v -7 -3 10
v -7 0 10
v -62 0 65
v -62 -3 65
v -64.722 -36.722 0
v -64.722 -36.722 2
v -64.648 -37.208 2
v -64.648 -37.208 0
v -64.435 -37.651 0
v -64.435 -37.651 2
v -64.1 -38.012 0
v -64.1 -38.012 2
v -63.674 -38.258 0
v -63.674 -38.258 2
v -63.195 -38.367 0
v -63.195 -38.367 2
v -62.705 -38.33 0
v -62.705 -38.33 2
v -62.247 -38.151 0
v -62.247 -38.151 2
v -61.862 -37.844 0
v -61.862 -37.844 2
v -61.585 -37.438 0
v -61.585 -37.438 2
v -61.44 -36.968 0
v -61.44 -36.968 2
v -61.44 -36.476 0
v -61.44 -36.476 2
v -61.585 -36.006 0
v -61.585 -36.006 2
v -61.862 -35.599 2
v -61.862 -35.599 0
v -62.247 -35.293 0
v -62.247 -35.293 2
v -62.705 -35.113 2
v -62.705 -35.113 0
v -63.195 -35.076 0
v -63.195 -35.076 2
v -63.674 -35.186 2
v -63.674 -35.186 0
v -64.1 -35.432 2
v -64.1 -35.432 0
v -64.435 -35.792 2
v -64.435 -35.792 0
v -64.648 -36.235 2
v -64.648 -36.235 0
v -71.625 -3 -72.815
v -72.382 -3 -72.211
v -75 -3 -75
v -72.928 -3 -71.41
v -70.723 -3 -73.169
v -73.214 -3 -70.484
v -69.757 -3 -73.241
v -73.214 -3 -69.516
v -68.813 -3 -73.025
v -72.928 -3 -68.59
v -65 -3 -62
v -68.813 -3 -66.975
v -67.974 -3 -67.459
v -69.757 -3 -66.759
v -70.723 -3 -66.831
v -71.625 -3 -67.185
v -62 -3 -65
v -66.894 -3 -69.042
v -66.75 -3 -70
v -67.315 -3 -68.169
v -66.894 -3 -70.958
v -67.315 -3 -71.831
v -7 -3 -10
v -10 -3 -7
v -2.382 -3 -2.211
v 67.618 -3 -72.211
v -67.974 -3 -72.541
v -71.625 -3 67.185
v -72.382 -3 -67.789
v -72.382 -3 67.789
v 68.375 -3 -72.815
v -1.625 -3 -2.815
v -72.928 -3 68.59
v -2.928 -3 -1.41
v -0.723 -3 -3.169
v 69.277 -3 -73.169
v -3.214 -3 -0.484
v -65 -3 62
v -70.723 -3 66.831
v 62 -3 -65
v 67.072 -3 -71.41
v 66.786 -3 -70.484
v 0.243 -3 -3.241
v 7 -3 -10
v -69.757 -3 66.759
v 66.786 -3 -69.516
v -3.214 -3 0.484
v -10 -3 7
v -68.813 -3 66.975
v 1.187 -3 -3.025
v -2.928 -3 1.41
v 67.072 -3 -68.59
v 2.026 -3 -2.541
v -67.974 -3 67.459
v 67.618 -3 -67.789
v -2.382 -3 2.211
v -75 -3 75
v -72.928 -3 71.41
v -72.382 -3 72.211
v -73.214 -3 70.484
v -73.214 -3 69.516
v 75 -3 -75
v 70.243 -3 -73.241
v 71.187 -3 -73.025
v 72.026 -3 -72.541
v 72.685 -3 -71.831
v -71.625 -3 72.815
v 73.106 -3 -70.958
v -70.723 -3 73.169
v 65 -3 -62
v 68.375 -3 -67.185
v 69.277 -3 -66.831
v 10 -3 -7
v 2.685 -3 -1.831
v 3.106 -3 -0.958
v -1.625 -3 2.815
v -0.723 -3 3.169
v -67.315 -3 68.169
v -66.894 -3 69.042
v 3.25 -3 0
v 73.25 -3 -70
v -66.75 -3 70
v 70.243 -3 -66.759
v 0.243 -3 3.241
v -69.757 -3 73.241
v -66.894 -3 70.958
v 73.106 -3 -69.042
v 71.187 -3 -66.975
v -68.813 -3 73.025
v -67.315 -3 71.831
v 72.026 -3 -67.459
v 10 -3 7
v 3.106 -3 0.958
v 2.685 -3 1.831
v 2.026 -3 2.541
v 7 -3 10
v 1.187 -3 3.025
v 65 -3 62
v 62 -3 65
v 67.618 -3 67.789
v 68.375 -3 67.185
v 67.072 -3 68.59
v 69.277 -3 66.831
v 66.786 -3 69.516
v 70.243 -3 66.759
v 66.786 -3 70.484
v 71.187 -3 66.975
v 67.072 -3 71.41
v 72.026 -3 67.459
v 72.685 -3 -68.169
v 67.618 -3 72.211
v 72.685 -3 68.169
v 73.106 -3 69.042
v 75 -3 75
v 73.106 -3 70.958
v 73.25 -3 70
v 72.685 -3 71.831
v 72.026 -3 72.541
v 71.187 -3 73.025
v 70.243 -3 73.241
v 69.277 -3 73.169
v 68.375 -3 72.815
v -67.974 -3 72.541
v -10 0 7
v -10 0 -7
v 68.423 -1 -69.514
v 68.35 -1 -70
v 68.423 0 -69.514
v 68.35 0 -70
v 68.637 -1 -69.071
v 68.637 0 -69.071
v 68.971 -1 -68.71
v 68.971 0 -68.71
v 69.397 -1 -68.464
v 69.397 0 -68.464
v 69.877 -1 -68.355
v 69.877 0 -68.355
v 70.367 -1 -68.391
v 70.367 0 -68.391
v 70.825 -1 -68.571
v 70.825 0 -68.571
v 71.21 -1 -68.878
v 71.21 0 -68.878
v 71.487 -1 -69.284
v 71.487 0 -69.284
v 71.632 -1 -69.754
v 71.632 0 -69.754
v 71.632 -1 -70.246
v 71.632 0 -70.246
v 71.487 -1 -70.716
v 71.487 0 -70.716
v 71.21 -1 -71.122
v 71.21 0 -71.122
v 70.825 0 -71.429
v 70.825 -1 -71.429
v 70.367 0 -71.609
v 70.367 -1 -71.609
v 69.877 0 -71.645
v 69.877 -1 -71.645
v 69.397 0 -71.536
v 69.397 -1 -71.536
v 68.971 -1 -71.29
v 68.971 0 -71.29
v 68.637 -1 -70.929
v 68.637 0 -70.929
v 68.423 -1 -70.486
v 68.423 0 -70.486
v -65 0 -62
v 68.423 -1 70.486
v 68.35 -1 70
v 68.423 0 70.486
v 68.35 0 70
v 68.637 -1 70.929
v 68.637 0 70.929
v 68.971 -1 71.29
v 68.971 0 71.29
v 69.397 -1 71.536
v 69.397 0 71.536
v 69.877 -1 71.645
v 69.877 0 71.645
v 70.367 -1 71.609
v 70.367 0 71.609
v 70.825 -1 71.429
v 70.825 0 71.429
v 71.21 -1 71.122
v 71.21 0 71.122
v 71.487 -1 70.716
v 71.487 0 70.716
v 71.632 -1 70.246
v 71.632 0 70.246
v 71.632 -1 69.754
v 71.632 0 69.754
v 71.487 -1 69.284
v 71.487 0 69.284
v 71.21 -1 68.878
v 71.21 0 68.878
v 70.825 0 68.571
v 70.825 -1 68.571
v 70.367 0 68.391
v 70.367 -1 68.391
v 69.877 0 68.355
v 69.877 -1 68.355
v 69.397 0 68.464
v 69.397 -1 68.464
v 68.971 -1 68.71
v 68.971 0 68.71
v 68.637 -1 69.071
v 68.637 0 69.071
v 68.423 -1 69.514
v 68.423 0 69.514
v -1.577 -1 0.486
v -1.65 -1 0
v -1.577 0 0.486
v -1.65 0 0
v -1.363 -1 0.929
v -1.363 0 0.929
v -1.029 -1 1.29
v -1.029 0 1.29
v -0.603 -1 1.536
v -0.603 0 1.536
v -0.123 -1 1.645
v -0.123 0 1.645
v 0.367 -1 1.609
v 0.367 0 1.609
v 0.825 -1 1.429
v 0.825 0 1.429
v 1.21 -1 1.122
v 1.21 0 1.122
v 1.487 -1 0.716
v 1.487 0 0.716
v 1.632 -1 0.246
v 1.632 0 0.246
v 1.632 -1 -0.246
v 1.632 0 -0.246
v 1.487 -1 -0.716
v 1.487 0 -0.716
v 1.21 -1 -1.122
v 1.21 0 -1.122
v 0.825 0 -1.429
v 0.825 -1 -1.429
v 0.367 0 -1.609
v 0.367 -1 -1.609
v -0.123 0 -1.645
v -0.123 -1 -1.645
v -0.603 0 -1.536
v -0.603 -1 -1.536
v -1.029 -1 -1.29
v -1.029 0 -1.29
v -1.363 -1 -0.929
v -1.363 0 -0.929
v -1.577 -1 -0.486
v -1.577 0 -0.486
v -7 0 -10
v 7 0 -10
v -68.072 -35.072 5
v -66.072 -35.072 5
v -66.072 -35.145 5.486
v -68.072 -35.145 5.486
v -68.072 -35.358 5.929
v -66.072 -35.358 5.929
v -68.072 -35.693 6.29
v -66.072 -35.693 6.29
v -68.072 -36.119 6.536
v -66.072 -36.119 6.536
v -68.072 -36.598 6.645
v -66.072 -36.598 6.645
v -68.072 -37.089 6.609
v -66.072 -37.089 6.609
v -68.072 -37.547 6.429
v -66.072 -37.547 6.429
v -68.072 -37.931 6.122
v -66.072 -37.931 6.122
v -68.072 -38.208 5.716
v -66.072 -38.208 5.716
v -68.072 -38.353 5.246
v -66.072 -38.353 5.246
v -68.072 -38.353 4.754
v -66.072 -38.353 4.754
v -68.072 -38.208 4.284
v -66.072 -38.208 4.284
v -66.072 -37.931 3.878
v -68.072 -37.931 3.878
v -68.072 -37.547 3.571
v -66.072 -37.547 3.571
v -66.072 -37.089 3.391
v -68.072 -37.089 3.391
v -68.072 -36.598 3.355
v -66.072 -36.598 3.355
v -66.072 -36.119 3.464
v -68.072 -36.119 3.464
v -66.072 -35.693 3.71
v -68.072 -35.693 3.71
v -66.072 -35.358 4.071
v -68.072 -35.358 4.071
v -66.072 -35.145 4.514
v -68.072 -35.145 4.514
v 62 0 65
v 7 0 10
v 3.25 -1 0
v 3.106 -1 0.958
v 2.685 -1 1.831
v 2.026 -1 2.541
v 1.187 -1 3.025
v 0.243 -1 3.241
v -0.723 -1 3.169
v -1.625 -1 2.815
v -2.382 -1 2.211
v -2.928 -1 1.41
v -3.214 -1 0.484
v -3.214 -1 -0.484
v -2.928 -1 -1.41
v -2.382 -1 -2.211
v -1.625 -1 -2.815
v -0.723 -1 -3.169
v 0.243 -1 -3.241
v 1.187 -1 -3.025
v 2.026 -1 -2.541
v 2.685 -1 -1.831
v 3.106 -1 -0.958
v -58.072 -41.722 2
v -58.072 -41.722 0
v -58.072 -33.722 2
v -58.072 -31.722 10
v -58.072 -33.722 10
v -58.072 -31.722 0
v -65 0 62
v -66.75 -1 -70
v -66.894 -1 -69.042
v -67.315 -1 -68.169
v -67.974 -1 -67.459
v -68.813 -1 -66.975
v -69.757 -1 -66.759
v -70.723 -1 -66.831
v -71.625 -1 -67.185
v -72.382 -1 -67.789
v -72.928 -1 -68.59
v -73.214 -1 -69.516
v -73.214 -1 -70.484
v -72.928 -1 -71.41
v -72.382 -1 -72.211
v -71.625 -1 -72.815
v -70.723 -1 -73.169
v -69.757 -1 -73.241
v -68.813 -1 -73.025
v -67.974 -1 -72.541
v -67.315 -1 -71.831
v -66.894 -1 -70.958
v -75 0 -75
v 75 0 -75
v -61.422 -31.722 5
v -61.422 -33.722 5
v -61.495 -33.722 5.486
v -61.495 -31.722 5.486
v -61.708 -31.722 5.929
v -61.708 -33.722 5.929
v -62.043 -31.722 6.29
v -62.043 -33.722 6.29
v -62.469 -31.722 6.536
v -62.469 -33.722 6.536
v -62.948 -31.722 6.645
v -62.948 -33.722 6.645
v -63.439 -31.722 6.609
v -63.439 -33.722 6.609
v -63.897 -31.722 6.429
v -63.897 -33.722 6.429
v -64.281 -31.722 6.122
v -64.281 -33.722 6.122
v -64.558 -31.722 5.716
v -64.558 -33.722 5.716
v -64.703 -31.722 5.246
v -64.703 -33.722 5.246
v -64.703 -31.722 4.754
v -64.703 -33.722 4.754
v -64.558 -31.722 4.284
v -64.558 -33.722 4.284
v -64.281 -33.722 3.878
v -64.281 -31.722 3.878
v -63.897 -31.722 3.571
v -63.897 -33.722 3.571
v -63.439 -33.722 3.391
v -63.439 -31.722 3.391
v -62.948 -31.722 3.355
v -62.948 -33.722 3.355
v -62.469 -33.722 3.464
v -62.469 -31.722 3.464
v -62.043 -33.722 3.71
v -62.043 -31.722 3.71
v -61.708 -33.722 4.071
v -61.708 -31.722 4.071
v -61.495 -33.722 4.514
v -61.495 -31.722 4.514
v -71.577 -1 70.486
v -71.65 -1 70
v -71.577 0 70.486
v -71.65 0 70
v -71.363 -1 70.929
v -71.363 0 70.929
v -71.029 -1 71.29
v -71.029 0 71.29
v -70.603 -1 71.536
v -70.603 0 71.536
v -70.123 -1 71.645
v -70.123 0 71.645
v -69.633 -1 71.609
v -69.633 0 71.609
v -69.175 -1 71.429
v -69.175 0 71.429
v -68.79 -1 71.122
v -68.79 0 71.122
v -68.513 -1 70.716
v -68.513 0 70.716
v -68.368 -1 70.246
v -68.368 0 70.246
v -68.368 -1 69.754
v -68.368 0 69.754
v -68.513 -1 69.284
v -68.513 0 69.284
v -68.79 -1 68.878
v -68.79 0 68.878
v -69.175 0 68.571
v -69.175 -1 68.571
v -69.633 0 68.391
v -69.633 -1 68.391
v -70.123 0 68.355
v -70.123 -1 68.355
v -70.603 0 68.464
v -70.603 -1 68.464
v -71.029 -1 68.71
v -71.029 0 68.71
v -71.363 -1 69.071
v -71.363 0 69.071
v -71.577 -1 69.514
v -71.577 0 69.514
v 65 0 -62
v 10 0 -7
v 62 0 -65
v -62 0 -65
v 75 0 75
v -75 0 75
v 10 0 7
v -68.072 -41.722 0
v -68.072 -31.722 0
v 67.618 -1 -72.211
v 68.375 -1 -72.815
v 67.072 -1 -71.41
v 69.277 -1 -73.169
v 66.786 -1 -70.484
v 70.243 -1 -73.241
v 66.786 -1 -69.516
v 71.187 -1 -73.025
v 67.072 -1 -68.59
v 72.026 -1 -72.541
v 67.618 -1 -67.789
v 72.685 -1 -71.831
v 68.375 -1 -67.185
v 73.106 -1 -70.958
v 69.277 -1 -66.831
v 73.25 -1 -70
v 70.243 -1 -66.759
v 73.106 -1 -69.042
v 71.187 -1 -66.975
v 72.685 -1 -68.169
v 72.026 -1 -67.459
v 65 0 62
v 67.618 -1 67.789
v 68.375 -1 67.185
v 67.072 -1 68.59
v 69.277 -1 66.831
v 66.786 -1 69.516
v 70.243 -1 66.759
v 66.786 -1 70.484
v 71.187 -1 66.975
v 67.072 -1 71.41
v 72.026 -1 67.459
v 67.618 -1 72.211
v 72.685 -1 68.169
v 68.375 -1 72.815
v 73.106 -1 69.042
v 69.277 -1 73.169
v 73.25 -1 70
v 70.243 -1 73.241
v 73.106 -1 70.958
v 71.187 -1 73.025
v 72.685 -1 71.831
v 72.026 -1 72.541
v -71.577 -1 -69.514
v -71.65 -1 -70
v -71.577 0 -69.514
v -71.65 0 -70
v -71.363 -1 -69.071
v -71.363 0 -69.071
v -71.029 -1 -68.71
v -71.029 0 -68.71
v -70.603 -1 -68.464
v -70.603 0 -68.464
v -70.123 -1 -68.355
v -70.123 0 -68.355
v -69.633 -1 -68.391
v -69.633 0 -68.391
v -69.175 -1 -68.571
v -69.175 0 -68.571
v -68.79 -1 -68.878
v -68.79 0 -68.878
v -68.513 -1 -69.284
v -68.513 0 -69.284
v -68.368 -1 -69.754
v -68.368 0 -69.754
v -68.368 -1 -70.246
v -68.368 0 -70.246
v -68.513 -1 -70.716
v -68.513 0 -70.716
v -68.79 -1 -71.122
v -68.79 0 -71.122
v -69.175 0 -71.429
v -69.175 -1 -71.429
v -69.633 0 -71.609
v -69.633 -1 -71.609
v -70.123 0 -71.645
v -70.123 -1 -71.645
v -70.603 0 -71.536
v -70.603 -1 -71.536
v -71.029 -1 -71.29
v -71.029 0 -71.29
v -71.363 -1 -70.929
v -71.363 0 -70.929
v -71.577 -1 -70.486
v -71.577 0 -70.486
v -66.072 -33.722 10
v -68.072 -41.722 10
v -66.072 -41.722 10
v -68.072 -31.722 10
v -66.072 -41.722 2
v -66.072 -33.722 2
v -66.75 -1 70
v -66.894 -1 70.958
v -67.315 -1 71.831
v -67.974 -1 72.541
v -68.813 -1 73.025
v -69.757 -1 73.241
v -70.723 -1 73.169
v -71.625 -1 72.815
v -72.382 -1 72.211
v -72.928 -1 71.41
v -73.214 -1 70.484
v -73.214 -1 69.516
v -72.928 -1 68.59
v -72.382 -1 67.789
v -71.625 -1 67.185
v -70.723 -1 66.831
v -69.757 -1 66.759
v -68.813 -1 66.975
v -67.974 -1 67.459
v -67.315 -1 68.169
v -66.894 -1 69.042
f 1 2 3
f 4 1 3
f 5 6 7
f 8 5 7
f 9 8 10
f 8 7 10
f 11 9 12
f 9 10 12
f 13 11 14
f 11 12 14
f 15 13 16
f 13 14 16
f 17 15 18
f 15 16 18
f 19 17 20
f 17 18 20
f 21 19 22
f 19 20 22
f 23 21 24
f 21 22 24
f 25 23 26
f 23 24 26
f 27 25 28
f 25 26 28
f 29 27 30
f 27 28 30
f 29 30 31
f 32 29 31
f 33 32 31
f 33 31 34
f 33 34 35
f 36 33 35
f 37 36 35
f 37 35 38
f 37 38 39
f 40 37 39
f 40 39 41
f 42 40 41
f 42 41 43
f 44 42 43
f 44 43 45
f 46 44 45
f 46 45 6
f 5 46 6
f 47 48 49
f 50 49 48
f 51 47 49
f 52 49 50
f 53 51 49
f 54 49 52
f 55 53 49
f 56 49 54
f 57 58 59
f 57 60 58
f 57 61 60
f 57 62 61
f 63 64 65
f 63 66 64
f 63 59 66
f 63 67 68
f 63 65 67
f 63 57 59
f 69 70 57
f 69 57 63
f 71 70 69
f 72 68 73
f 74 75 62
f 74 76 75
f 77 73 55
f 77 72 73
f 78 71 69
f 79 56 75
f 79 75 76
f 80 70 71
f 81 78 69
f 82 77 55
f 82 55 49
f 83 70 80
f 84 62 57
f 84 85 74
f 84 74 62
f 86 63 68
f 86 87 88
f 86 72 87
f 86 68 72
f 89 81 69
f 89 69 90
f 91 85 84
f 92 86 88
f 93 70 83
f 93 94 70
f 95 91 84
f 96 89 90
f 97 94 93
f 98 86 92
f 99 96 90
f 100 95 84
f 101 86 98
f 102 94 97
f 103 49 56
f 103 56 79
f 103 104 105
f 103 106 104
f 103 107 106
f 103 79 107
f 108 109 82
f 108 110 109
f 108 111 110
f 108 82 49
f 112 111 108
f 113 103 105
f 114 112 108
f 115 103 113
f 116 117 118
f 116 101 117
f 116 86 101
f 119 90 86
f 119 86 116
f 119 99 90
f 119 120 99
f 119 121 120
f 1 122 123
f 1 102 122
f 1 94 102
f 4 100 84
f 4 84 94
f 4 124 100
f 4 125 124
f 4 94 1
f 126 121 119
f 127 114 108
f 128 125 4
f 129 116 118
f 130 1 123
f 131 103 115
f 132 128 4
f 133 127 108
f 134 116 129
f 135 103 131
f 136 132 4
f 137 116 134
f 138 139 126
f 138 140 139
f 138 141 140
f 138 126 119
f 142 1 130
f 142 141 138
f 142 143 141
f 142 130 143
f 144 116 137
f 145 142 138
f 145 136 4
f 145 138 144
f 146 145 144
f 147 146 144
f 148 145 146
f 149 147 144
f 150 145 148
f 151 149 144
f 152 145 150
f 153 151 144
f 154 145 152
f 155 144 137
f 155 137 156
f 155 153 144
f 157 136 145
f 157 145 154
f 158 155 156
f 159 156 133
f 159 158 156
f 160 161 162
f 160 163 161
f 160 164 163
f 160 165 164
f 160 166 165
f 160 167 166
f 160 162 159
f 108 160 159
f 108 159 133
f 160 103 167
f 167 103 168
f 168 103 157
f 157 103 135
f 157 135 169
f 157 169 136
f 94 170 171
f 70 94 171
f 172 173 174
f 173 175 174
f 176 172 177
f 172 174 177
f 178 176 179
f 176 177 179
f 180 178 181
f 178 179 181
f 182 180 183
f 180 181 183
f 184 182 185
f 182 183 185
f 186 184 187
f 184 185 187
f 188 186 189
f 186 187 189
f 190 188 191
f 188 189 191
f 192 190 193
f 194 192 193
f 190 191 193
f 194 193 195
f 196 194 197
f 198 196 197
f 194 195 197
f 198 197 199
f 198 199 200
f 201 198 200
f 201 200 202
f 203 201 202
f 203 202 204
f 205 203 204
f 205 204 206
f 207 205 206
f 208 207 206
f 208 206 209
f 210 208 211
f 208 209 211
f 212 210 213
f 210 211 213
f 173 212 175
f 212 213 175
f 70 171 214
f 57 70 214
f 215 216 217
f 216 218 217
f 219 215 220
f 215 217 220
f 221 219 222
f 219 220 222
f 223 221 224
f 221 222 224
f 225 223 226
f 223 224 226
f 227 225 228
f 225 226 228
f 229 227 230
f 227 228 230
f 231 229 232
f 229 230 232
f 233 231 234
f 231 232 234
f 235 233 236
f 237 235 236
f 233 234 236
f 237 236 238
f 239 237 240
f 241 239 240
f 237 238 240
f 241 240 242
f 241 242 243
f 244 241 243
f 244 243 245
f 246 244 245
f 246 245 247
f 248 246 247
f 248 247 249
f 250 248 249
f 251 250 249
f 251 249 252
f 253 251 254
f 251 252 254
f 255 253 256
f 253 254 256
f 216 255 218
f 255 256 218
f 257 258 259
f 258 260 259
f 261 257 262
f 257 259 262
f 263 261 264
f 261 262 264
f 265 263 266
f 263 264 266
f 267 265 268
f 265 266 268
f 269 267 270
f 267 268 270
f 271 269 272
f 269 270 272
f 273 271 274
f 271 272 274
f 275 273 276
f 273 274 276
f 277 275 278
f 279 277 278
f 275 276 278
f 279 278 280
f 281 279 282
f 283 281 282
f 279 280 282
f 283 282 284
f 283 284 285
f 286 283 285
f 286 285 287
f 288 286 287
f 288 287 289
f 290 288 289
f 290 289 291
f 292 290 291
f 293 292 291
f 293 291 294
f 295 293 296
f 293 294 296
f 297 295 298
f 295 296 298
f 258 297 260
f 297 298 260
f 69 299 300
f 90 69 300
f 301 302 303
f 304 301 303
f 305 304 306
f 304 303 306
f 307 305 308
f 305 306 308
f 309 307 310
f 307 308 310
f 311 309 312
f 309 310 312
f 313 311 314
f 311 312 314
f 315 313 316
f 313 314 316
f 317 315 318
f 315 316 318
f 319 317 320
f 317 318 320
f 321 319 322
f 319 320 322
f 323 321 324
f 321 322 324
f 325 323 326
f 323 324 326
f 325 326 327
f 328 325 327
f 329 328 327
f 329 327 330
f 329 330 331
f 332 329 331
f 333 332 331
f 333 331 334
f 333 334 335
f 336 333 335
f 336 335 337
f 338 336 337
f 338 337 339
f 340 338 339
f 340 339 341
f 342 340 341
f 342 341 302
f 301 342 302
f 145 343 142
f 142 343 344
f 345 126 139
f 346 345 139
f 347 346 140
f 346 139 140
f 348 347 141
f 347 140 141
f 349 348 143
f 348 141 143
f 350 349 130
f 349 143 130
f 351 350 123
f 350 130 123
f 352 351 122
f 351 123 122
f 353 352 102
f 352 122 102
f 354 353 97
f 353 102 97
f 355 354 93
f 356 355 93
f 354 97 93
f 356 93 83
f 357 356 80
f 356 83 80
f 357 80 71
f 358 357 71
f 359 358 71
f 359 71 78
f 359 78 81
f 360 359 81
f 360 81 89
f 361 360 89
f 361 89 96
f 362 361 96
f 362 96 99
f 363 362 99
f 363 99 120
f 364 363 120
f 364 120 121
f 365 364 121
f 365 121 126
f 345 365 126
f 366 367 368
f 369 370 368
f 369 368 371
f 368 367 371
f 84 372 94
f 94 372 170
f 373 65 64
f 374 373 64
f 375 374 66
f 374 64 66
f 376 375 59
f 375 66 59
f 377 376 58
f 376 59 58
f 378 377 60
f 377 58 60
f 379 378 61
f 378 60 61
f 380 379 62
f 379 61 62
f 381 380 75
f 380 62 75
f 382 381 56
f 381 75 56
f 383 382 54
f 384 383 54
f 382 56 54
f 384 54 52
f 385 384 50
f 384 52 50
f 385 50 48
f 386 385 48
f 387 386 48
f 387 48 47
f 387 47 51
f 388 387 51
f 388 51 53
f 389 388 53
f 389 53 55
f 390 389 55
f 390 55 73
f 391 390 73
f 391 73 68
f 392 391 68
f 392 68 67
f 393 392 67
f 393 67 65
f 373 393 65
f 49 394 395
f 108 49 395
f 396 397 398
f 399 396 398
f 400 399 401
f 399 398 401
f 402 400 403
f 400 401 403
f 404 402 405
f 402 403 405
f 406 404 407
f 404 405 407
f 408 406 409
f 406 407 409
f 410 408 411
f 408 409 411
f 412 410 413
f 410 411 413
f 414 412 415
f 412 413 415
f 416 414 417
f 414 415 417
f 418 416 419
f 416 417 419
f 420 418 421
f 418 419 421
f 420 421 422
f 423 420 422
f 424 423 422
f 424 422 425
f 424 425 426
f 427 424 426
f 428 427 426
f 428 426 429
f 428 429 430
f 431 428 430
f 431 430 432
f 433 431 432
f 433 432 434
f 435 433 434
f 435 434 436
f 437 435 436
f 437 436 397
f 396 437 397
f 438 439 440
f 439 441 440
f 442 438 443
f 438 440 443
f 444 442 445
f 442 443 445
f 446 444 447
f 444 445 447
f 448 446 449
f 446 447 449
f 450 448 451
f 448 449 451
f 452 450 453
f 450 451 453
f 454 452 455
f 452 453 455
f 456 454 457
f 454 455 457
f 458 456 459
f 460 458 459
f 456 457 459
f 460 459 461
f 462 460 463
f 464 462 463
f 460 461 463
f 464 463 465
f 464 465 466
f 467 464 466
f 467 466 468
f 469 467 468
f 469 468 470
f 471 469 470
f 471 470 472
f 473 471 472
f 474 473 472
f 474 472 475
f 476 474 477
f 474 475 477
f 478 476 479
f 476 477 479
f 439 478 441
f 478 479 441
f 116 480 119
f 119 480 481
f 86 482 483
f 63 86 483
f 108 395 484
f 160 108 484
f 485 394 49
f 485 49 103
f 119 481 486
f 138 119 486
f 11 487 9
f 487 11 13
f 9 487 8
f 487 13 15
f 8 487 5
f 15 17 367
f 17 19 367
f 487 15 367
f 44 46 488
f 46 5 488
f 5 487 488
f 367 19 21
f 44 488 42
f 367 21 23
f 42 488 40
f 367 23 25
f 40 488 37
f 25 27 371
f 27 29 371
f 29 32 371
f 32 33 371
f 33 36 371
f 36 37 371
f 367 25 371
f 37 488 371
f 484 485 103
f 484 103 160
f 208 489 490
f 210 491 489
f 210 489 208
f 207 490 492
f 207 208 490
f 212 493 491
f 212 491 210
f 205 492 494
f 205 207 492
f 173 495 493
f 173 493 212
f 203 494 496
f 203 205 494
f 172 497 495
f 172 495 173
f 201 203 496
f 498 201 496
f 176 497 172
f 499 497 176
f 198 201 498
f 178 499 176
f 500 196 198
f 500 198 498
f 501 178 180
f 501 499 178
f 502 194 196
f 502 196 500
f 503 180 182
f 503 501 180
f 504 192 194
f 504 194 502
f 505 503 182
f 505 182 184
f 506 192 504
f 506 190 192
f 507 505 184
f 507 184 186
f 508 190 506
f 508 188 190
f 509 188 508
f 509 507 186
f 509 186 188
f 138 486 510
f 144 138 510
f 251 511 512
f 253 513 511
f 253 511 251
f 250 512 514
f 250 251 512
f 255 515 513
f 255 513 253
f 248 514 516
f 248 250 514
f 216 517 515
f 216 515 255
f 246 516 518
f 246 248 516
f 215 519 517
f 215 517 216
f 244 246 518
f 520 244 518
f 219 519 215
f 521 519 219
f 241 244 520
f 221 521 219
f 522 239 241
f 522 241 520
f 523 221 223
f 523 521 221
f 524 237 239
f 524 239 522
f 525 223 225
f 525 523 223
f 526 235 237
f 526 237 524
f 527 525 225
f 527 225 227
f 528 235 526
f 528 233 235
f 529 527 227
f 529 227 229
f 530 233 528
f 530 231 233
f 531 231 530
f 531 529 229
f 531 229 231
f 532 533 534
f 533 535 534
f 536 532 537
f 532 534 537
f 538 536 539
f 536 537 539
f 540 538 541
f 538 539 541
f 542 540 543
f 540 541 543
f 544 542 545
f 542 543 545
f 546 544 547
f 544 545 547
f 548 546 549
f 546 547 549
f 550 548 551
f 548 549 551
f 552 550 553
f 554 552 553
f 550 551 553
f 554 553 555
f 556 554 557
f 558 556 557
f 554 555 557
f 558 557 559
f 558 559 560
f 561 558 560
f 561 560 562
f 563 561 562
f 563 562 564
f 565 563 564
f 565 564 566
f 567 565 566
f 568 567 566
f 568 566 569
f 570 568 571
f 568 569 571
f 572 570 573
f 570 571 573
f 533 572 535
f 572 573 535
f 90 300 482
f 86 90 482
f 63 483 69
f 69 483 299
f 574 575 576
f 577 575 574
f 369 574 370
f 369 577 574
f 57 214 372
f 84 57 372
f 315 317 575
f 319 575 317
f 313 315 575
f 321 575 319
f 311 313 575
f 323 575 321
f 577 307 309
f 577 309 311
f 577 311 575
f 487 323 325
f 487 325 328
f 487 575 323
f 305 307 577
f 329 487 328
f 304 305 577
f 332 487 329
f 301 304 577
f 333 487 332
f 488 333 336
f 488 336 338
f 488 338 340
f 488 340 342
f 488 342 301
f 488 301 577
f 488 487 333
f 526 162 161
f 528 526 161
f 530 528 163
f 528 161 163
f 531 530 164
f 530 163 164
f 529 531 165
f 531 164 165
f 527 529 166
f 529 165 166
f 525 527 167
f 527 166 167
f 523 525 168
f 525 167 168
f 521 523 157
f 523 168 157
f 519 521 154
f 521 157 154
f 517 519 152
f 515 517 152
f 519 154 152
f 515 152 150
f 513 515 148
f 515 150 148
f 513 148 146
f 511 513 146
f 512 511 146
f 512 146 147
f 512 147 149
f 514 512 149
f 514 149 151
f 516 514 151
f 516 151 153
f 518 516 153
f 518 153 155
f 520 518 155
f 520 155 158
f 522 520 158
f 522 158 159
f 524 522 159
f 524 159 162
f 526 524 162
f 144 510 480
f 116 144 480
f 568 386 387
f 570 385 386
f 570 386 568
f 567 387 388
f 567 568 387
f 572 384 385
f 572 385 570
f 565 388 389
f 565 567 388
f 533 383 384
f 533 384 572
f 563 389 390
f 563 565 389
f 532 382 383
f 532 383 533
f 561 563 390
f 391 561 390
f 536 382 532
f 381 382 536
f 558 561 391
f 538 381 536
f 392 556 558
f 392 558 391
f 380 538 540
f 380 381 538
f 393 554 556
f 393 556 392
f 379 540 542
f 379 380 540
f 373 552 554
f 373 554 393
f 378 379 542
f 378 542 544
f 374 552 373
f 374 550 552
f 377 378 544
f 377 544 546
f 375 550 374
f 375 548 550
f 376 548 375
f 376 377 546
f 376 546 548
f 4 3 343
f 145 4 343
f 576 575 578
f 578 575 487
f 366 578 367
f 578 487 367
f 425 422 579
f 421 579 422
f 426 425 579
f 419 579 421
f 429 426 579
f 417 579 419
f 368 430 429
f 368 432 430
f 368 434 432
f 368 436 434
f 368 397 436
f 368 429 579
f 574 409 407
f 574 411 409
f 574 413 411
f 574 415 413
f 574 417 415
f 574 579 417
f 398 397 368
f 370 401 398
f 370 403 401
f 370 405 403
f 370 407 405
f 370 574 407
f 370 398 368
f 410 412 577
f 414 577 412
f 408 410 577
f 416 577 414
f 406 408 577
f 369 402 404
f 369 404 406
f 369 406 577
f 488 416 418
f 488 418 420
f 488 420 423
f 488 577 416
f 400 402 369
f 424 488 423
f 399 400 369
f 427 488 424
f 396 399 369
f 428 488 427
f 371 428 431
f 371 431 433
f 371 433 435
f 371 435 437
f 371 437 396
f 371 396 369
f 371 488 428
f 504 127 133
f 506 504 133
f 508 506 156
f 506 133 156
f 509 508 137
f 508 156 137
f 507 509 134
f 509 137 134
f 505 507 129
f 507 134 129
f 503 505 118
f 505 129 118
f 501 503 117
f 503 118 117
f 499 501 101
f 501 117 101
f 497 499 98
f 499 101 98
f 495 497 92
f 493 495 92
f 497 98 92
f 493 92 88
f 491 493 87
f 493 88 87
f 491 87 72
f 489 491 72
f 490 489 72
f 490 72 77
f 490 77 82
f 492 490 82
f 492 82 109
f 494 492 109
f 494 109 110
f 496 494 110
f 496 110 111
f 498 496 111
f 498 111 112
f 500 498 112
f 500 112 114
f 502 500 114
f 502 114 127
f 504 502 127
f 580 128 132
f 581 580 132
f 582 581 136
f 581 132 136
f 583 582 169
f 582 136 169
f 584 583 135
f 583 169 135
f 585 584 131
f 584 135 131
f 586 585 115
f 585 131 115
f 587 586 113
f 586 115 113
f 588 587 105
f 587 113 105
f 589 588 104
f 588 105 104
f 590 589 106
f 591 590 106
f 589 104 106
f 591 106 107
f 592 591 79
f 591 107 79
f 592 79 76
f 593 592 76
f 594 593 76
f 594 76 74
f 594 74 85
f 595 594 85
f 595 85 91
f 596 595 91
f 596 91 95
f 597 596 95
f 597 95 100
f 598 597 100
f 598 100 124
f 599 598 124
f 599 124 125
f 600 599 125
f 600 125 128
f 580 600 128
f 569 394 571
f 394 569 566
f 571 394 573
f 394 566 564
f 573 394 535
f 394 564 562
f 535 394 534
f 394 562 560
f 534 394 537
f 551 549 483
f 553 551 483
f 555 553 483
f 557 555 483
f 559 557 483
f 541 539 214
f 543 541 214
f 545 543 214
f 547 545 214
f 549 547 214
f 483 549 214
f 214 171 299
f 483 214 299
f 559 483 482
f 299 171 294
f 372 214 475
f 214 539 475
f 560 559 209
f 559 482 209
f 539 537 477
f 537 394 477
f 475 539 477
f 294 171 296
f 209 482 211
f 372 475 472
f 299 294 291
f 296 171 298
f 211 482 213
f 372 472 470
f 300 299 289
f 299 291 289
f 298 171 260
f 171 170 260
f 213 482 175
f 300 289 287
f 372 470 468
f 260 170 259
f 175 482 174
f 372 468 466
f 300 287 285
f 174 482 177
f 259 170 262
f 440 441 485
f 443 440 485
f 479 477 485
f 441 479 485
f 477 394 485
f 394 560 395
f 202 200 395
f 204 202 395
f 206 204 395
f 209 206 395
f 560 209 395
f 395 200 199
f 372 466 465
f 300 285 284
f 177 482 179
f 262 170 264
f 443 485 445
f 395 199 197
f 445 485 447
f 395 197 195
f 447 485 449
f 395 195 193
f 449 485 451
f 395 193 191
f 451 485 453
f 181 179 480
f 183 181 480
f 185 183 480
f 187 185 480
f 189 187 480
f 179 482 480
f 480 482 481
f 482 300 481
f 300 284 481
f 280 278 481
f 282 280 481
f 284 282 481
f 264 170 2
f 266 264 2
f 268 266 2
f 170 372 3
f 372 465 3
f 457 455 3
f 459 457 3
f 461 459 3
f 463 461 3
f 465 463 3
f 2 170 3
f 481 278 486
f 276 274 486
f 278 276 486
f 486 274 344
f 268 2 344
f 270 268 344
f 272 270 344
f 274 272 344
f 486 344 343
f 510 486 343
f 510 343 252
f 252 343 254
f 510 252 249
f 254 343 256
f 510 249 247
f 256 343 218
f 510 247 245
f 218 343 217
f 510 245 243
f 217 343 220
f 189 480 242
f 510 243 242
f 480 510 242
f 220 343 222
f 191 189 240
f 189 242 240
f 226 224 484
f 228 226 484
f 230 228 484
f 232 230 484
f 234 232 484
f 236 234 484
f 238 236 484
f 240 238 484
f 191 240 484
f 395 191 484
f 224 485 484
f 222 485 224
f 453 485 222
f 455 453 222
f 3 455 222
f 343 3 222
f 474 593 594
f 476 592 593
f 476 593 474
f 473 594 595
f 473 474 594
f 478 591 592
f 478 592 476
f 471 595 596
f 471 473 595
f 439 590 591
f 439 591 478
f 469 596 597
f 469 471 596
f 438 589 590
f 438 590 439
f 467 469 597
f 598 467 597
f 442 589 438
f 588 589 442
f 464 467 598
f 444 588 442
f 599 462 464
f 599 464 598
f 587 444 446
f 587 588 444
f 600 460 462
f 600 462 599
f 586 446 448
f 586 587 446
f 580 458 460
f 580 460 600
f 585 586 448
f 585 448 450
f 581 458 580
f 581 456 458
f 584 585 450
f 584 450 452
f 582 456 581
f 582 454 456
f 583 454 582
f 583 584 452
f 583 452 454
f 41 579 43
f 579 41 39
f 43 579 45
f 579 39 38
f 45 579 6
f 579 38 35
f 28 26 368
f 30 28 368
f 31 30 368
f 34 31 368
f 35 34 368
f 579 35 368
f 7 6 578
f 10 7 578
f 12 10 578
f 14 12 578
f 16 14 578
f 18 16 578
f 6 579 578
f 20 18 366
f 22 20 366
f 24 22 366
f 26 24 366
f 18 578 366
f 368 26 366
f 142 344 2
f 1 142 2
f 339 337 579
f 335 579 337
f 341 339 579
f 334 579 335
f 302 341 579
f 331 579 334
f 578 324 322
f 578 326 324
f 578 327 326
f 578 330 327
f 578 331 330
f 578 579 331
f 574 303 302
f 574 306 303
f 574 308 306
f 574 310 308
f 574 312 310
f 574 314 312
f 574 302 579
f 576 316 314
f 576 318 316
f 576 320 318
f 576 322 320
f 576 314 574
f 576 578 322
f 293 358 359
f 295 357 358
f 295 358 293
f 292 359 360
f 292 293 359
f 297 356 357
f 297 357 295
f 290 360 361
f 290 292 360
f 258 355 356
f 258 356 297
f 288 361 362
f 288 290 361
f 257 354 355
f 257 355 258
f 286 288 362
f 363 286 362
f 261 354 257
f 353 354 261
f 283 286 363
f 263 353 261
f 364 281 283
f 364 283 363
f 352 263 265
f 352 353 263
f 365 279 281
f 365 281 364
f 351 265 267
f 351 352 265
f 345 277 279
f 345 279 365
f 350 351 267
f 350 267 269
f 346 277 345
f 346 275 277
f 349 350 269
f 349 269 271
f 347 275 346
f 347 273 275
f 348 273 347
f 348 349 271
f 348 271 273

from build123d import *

# Parameters (mm, degrees)
F0_W           = 150
F0_H           = 150
F1_DEPTH       = 3
F3_D           = 3.3
F3_CBORE_D     = 6.5
F3_CBORE_DEPTH = 2
F4_W           = 10
F4_H           = 10
F5_DEPTH       = 10
F6_W           = 8
F6_H           = 8
F7_DEPTH       = 8
F11_D          = 3.3
F11_ON_F8_D    = 3.3
F11_ON_F9_D    = 3.3


with BuildPart() as f1:
    # F0 (on Front) → F1 (new body)
    with BuildSketch(Plane.XZ):
        Rectangle(F0_W, F0_H)
        Polygon((62, -65), (-62, -65), (-7, -10), (7, -10), align=None, mode=Mode.SUBTRACT)
        Polygon((-10, 7), (-10, -7), (-65, -62), (-65, 62), align=None, mode=Mode.SUBTRACT)
        Polygon((65, -62), (10, -7), (10, 7), (65, 62), align=None, mode=Mode.SUBTRACT)
        Polygon((-7, 10), (-62, 65), (62, 65), (7, 10), align=None, mode=Mode.SUBTRACT)
    extrude(amount=F1_DEPTH)

    # F3 (through all)
    with Locations(Plane.XZ.offset(3)):
        with Locations((0, 0), (-70, 70), (70, 70), (70, -70), (-70, -70)):
            CounterBoreHole(F3_D / 2, F3_CBORE_D / 2, F3_CBORE_DEPTH)


with BuildPart() as f5:
    # F4 (on Top) → F5 (new body)
    with BuildSketch(Plane.XY):
        with Locations((-63.0716755986, -36.7216779933)):
            Rectangle(F4_W, F4_H)
    extrude(amount=F5_DEPTH)

    # F6 (on face) → F7 (cut)
    with BuildSketch(Plane.XZ.offset(41.7216779933)):
        with Locations((-62.0716755986, 6)):
            Rectangle(F6_W, F6_H)
    extrude(amount=-F7_DEPTH, mode=Mode.SUBTRACT)

    # F11 (through all)
    with Locations(Plane(origin=(0, -31.7216779933, 0), x_dir=(-1, 0, 0), z_dir=(0, 1, 0))):
        with Locations((63.0716755986, 5)):
            Hole(F11_D / 2)

    # F11 on F8 (through all)
    with Locations(Plane(origin=(-68.0716755986, 0, 0), x_dir=(0, -1, 0), z_dir=(-1, 0, 0))):
        with Locations((36.7216779933, 5)):
            Hole(F11_ON_F8_D / 2)

    # F11 on F9 (through all)
    with Locations(Plane(origin=(0, 0, 0), x_dir=(1, 0, 0), z_dir=(0, 0, -1))):
        with Locations((-63.0716755986, 36.7216779933)):
            Hole(F11_ON_F9_D / 2)


solid = Compound([f1.part, f5.part])
